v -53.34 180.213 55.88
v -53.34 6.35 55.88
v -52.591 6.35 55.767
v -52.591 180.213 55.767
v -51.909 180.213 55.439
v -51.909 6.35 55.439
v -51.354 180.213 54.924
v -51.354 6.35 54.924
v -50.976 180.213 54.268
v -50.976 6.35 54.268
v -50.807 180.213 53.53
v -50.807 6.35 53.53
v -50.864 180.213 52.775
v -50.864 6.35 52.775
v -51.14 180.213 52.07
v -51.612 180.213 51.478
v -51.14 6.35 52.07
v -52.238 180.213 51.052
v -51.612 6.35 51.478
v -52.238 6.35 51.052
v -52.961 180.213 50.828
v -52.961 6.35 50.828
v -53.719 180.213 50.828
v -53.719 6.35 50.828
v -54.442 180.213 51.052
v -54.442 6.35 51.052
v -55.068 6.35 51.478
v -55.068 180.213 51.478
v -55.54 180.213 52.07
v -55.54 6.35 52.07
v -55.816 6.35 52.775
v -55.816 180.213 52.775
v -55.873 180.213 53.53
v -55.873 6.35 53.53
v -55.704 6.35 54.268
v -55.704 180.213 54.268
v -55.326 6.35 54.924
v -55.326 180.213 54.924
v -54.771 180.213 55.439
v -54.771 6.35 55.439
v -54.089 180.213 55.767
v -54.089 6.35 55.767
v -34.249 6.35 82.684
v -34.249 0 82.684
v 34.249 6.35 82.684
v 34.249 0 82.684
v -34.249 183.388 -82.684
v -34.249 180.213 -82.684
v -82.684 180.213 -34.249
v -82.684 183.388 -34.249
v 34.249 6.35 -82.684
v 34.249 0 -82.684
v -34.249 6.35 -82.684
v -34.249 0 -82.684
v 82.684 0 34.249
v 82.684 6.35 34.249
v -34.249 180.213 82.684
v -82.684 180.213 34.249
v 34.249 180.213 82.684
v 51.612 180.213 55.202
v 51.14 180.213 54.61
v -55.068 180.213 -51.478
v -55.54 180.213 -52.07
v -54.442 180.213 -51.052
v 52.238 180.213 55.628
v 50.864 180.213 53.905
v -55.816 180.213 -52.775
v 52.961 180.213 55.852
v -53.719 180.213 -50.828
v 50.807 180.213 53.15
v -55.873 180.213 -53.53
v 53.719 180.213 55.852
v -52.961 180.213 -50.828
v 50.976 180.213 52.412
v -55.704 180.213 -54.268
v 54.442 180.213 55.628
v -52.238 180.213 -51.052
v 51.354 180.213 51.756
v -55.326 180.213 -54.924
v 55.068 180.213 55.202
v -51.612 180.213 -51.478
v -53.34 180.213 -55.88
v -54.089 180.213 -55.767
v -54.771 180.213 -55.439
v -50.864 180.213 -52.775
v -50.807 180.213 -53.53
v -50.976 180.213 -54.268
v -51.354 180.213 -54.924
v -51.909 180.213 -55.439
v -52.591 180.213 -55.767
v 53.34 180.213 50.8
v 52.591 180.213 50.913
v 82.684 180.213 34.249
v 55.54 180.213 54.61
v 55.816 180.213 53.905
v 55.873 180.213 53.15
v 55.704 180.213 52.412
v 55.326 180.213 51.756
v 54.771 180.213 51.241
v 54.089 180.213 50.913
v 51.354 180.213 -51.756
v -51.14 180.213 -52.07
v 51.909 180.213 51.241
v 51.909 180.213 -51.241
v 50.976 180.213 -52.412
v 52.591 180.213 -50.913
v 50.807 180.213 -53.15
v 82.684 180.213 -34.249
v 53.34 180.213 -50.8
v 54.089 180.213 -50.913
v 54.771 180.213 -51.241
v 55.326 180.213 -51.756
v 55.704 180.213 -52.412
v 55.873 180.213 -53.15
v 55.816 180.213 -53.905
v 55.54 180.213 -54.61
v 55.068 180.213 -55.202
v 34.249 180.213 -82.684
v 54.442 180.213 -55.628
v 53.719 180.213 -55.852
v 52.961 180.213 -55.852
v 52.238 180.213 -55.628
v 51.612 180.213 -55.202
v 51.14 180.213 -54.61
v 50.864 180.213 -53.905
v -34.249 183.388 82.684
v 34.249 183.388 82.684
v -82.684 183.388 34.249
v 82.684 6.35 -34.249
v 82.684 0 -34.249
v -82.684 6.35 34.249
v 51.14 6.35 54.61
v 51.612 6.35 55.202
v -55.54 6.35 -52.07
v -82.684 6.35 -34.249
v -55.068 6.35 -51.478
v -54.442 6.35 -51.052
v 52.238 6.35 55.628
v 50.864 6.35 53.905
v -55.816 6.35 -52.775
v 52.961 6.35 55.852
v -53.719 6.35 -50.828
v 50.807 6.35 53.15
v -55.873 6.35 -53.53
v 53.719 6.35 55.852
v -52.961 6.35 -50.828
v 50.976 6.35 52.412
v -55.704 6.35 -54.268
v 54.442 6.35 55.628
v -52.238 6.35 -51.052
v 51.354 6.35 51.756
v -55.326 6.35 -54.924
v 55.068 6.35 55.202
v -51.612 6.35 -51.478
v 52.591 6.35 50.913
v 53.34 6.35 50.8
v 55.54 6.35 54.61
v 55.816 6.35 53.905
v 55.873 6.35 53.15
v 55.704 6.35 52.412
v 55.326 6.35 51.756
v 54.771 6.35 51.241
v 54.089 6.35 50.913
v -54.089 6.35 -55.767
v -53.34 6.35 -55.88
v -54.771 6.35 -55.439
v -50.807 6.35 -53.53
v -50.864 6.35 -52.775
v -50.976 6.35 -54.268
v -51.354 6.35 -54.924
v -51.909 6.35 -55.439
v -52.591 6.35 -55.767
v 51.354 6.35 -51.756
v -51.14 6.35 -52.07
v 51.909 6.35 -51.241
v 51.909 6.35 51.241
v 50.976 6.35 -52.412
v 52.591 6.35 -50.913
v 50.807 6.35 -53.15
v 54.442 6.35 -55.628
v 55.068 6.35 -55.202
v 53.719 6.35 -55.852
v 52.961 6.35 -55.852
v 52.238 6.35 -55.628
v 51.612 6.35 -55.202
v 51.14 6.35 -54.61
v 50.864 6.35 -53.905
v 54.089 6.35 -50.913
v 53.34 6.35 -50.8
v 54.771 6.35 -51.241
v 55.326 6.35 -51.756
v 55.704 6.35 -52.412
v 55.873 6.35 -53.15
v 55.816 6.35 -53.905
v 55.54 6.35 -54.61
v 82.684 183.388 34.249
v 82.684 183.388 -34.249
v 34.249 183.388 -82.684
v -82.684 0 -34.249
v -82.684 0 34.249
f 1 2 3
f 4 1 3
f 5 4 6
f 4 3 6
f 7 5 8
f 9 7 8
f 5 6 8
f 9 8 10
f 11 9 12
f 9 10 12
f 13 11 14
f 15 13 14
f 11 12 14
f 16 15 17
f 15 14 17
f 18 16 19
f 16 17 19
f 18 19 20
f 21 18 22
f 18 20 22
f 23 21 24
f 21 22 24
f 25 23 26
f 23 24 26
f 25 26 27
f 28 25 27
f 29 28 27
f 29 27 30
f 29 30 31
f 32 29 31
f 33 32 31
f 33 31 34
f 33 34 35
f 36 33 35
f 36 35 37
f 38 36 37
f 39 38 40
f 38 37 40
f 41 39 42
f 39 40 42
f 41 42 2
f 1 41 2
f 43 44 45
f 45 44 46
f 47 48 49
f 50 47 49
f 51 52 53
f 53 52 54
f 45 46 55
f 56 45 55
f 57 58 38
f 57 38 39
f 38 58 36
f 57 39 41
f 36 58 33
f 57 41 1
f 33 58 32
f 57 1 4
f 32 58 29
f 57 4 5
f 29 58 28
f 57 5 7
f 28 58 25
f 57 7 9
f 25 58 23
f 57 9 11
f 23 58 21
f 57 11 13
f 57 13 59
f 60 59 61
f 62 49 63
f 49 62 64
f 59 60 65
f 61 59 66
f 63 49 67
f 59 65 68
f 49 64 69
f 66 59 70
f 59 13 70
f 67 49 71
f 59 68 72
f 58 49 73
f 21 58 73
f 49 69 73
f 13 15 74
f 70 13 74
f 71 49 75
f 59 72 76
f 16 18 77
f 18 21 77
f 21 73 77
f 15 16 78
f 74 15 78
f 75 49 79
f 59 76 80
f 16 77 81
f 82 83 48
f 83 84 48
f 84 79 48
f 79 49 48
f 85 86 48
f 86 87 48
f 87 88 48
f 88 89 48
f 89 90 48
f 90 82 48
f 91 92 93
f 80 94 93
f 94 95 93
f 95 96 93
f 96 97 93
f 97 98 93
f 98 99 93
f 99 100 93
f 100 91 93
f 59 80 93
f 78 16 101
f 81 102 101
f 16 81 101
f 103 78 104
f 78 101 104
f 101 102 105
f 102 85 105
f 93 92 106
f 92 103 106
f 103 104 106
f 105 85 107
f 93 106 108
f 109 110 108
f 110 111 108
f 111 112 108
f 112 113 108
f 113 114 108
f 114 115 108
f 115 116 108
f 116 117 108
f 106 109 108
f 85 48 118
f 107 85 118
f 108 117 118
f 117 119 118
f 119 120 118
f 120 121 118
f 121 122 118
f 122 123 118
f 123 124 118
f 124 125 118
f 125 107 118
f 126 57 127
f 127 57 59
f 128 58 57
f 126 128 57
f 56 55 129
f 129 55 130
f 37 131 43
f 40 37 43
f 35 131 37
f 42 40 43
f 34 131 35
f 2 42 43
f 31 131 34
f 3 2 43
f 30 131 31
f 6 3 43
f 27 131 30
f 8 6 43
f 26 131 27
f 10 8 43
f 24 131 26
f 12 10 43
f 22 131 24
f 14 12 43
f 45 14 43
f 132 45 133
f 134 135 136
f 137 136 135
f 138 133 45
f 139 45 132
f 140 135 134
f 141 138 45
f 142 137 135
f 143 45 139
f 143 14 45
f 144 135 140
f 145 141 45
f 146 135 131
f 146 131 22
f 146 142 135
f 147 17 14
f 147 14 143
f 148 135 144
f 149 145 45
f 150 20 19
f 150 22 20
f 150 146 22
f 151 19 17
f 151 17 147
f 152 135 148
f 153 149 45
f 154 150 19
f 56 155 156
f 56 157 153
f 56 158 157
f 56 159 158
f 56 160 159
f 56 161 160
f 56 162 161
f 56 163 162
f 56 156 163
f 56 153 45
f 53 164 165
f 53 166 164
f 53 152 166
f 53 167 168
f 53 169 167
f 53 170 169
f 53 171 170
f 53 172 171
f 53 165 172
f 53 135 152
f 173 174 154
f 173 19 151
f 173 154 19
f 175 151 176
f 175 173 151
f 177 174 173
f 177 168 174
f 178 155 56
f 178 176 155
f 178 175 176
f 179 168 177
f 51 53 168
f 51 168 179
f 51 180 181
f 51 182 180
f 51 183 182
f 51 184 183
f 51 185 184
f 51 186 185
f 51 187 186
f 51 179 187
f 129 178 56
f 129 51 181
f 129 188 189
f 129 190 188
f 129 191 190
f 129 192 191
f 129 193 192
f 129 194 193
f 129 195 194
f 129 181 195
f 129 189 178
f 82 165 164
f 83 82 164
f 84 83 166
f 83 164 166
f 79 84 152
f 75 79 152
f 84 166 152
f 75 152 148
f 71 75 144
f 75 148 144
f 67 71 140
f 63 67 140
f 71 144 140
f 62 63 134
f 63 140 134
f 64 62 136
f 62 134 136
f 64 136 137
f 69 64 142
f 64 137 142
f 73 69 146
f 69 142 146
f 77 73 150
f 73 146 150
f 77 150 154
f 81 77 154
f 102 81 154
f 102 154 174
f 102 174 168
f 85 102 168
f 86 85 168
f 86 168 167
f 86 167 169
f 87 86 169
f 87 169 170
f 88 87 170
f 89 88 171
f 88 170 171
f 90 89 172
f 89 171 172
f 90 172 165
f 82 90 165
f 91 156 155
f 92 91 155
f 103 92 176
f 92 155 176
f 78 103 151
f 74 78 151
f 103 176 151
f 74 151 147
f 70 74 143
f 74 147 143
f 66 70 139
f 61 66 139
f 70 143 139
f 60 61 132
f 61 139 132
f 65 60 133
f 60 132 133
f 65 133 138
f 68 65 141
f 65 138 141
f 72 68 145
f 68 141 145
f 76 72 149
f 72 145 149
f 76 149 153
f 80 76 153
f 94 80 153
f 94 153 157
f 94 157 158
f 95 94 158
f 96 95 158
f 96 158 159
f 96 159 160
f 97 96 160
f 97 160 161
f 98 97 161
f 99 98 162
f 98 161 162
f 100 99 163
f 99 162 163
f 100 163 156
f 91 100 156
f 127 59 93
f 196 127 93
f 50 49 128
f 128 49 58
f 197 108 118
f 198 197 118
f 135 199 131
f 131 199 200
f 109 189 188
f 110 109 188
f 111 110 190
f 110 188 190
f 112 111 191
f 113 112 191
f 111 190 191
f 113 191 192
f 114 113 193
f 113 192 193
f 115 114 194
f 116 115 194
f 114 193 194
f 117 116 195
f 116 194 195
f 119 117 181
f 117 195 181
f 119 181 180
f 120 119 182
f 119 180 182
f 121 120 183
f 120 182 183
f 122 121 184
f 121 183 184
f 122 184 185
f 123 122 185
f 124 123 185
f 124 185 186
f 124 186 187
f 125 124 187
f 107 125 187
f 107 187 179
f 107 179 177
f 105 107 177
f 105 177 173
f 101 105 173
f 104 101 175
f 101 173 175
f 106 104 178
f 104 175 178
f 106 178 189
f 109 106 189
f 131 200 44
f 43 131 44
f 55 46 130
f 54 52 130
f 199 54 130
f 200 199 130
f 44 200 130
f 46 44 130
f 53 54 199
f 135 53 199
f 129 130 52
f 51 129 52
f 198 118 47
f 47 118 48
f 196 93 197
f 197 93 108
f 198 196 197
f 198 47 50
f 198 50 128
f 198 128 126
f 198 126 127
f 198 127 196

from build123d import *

# Parameters (mm, degrees)
BOSS_EXTRUDE1_DEPTH = 6.35
SKETCH2_R           = 2.54
BOSS_EXTRUDE2_DEPTH = 173.863
BOSS_EXTRUDE3_DEPTH = 3.175


with BuildPart() as part:
    # Sketch1 → Boss-Extrude1 (new body)
    with BuildSketch(Plane(origin=(0, 0, 0), x_dir=(1, 0, 0), z_dir=(0, 1, 0))):
        Polygon((34.248980878, -82.684354133), (82.684354133, -34.248980878), (82.684354133, 34.248980878), (34.248980878, 82.684354133), (-34.248980878, 82.684354133), (-82.684354133, 34.248980878), (-82.684354133, -34.248980878), (-34.248980878, -82.684354133), align=None)
    extrude(amount=BOSS_EXTRUDE1_DEPTH)

    # Sketch2 → Boss-Extrude2 (add)
    with BuildSketch(Plane(origin=(0, 6.35, 0), x_dir=(1, 0, 0), z_dir=(0, 1, 0))):
        with Locations((53.34, 53.34)):
            Circle(SKETCH2_R)
        with Locations((-53.34, 53.34)):
            Circle(SKETCH2_R)
        with Locations((53.34, -53.34)):
            Circle(SKETCH2_R)
        with Locations((-53.34, -53.34)):
            Circle(SKETCH2_R)
    extrude(amount=BOSS_EXTRUDE2_DEPTH)

    # Sketch3 → Boss-Extrude3 (add)
    with BuildSketch(Plane(origin=(0, 180.213, 0), x_dir=(1, 0, 0), z_dir=(0, 1, 0))):
        Polygon((82.684354133, -34.248980878), (82.684354133, 34.248980878), (34.248980878, 82.684354133), (-34.248980878, 82.684354133), (-82.684354133, 34.248980878), (-82.684354133, -34.248980878), (-34.248980878, -82.684354133), (34.248980878, -82.684354133), align=None)
    extrude(amount=BOSS_EXTRUDE3_DEPTH)


solid = part.part
